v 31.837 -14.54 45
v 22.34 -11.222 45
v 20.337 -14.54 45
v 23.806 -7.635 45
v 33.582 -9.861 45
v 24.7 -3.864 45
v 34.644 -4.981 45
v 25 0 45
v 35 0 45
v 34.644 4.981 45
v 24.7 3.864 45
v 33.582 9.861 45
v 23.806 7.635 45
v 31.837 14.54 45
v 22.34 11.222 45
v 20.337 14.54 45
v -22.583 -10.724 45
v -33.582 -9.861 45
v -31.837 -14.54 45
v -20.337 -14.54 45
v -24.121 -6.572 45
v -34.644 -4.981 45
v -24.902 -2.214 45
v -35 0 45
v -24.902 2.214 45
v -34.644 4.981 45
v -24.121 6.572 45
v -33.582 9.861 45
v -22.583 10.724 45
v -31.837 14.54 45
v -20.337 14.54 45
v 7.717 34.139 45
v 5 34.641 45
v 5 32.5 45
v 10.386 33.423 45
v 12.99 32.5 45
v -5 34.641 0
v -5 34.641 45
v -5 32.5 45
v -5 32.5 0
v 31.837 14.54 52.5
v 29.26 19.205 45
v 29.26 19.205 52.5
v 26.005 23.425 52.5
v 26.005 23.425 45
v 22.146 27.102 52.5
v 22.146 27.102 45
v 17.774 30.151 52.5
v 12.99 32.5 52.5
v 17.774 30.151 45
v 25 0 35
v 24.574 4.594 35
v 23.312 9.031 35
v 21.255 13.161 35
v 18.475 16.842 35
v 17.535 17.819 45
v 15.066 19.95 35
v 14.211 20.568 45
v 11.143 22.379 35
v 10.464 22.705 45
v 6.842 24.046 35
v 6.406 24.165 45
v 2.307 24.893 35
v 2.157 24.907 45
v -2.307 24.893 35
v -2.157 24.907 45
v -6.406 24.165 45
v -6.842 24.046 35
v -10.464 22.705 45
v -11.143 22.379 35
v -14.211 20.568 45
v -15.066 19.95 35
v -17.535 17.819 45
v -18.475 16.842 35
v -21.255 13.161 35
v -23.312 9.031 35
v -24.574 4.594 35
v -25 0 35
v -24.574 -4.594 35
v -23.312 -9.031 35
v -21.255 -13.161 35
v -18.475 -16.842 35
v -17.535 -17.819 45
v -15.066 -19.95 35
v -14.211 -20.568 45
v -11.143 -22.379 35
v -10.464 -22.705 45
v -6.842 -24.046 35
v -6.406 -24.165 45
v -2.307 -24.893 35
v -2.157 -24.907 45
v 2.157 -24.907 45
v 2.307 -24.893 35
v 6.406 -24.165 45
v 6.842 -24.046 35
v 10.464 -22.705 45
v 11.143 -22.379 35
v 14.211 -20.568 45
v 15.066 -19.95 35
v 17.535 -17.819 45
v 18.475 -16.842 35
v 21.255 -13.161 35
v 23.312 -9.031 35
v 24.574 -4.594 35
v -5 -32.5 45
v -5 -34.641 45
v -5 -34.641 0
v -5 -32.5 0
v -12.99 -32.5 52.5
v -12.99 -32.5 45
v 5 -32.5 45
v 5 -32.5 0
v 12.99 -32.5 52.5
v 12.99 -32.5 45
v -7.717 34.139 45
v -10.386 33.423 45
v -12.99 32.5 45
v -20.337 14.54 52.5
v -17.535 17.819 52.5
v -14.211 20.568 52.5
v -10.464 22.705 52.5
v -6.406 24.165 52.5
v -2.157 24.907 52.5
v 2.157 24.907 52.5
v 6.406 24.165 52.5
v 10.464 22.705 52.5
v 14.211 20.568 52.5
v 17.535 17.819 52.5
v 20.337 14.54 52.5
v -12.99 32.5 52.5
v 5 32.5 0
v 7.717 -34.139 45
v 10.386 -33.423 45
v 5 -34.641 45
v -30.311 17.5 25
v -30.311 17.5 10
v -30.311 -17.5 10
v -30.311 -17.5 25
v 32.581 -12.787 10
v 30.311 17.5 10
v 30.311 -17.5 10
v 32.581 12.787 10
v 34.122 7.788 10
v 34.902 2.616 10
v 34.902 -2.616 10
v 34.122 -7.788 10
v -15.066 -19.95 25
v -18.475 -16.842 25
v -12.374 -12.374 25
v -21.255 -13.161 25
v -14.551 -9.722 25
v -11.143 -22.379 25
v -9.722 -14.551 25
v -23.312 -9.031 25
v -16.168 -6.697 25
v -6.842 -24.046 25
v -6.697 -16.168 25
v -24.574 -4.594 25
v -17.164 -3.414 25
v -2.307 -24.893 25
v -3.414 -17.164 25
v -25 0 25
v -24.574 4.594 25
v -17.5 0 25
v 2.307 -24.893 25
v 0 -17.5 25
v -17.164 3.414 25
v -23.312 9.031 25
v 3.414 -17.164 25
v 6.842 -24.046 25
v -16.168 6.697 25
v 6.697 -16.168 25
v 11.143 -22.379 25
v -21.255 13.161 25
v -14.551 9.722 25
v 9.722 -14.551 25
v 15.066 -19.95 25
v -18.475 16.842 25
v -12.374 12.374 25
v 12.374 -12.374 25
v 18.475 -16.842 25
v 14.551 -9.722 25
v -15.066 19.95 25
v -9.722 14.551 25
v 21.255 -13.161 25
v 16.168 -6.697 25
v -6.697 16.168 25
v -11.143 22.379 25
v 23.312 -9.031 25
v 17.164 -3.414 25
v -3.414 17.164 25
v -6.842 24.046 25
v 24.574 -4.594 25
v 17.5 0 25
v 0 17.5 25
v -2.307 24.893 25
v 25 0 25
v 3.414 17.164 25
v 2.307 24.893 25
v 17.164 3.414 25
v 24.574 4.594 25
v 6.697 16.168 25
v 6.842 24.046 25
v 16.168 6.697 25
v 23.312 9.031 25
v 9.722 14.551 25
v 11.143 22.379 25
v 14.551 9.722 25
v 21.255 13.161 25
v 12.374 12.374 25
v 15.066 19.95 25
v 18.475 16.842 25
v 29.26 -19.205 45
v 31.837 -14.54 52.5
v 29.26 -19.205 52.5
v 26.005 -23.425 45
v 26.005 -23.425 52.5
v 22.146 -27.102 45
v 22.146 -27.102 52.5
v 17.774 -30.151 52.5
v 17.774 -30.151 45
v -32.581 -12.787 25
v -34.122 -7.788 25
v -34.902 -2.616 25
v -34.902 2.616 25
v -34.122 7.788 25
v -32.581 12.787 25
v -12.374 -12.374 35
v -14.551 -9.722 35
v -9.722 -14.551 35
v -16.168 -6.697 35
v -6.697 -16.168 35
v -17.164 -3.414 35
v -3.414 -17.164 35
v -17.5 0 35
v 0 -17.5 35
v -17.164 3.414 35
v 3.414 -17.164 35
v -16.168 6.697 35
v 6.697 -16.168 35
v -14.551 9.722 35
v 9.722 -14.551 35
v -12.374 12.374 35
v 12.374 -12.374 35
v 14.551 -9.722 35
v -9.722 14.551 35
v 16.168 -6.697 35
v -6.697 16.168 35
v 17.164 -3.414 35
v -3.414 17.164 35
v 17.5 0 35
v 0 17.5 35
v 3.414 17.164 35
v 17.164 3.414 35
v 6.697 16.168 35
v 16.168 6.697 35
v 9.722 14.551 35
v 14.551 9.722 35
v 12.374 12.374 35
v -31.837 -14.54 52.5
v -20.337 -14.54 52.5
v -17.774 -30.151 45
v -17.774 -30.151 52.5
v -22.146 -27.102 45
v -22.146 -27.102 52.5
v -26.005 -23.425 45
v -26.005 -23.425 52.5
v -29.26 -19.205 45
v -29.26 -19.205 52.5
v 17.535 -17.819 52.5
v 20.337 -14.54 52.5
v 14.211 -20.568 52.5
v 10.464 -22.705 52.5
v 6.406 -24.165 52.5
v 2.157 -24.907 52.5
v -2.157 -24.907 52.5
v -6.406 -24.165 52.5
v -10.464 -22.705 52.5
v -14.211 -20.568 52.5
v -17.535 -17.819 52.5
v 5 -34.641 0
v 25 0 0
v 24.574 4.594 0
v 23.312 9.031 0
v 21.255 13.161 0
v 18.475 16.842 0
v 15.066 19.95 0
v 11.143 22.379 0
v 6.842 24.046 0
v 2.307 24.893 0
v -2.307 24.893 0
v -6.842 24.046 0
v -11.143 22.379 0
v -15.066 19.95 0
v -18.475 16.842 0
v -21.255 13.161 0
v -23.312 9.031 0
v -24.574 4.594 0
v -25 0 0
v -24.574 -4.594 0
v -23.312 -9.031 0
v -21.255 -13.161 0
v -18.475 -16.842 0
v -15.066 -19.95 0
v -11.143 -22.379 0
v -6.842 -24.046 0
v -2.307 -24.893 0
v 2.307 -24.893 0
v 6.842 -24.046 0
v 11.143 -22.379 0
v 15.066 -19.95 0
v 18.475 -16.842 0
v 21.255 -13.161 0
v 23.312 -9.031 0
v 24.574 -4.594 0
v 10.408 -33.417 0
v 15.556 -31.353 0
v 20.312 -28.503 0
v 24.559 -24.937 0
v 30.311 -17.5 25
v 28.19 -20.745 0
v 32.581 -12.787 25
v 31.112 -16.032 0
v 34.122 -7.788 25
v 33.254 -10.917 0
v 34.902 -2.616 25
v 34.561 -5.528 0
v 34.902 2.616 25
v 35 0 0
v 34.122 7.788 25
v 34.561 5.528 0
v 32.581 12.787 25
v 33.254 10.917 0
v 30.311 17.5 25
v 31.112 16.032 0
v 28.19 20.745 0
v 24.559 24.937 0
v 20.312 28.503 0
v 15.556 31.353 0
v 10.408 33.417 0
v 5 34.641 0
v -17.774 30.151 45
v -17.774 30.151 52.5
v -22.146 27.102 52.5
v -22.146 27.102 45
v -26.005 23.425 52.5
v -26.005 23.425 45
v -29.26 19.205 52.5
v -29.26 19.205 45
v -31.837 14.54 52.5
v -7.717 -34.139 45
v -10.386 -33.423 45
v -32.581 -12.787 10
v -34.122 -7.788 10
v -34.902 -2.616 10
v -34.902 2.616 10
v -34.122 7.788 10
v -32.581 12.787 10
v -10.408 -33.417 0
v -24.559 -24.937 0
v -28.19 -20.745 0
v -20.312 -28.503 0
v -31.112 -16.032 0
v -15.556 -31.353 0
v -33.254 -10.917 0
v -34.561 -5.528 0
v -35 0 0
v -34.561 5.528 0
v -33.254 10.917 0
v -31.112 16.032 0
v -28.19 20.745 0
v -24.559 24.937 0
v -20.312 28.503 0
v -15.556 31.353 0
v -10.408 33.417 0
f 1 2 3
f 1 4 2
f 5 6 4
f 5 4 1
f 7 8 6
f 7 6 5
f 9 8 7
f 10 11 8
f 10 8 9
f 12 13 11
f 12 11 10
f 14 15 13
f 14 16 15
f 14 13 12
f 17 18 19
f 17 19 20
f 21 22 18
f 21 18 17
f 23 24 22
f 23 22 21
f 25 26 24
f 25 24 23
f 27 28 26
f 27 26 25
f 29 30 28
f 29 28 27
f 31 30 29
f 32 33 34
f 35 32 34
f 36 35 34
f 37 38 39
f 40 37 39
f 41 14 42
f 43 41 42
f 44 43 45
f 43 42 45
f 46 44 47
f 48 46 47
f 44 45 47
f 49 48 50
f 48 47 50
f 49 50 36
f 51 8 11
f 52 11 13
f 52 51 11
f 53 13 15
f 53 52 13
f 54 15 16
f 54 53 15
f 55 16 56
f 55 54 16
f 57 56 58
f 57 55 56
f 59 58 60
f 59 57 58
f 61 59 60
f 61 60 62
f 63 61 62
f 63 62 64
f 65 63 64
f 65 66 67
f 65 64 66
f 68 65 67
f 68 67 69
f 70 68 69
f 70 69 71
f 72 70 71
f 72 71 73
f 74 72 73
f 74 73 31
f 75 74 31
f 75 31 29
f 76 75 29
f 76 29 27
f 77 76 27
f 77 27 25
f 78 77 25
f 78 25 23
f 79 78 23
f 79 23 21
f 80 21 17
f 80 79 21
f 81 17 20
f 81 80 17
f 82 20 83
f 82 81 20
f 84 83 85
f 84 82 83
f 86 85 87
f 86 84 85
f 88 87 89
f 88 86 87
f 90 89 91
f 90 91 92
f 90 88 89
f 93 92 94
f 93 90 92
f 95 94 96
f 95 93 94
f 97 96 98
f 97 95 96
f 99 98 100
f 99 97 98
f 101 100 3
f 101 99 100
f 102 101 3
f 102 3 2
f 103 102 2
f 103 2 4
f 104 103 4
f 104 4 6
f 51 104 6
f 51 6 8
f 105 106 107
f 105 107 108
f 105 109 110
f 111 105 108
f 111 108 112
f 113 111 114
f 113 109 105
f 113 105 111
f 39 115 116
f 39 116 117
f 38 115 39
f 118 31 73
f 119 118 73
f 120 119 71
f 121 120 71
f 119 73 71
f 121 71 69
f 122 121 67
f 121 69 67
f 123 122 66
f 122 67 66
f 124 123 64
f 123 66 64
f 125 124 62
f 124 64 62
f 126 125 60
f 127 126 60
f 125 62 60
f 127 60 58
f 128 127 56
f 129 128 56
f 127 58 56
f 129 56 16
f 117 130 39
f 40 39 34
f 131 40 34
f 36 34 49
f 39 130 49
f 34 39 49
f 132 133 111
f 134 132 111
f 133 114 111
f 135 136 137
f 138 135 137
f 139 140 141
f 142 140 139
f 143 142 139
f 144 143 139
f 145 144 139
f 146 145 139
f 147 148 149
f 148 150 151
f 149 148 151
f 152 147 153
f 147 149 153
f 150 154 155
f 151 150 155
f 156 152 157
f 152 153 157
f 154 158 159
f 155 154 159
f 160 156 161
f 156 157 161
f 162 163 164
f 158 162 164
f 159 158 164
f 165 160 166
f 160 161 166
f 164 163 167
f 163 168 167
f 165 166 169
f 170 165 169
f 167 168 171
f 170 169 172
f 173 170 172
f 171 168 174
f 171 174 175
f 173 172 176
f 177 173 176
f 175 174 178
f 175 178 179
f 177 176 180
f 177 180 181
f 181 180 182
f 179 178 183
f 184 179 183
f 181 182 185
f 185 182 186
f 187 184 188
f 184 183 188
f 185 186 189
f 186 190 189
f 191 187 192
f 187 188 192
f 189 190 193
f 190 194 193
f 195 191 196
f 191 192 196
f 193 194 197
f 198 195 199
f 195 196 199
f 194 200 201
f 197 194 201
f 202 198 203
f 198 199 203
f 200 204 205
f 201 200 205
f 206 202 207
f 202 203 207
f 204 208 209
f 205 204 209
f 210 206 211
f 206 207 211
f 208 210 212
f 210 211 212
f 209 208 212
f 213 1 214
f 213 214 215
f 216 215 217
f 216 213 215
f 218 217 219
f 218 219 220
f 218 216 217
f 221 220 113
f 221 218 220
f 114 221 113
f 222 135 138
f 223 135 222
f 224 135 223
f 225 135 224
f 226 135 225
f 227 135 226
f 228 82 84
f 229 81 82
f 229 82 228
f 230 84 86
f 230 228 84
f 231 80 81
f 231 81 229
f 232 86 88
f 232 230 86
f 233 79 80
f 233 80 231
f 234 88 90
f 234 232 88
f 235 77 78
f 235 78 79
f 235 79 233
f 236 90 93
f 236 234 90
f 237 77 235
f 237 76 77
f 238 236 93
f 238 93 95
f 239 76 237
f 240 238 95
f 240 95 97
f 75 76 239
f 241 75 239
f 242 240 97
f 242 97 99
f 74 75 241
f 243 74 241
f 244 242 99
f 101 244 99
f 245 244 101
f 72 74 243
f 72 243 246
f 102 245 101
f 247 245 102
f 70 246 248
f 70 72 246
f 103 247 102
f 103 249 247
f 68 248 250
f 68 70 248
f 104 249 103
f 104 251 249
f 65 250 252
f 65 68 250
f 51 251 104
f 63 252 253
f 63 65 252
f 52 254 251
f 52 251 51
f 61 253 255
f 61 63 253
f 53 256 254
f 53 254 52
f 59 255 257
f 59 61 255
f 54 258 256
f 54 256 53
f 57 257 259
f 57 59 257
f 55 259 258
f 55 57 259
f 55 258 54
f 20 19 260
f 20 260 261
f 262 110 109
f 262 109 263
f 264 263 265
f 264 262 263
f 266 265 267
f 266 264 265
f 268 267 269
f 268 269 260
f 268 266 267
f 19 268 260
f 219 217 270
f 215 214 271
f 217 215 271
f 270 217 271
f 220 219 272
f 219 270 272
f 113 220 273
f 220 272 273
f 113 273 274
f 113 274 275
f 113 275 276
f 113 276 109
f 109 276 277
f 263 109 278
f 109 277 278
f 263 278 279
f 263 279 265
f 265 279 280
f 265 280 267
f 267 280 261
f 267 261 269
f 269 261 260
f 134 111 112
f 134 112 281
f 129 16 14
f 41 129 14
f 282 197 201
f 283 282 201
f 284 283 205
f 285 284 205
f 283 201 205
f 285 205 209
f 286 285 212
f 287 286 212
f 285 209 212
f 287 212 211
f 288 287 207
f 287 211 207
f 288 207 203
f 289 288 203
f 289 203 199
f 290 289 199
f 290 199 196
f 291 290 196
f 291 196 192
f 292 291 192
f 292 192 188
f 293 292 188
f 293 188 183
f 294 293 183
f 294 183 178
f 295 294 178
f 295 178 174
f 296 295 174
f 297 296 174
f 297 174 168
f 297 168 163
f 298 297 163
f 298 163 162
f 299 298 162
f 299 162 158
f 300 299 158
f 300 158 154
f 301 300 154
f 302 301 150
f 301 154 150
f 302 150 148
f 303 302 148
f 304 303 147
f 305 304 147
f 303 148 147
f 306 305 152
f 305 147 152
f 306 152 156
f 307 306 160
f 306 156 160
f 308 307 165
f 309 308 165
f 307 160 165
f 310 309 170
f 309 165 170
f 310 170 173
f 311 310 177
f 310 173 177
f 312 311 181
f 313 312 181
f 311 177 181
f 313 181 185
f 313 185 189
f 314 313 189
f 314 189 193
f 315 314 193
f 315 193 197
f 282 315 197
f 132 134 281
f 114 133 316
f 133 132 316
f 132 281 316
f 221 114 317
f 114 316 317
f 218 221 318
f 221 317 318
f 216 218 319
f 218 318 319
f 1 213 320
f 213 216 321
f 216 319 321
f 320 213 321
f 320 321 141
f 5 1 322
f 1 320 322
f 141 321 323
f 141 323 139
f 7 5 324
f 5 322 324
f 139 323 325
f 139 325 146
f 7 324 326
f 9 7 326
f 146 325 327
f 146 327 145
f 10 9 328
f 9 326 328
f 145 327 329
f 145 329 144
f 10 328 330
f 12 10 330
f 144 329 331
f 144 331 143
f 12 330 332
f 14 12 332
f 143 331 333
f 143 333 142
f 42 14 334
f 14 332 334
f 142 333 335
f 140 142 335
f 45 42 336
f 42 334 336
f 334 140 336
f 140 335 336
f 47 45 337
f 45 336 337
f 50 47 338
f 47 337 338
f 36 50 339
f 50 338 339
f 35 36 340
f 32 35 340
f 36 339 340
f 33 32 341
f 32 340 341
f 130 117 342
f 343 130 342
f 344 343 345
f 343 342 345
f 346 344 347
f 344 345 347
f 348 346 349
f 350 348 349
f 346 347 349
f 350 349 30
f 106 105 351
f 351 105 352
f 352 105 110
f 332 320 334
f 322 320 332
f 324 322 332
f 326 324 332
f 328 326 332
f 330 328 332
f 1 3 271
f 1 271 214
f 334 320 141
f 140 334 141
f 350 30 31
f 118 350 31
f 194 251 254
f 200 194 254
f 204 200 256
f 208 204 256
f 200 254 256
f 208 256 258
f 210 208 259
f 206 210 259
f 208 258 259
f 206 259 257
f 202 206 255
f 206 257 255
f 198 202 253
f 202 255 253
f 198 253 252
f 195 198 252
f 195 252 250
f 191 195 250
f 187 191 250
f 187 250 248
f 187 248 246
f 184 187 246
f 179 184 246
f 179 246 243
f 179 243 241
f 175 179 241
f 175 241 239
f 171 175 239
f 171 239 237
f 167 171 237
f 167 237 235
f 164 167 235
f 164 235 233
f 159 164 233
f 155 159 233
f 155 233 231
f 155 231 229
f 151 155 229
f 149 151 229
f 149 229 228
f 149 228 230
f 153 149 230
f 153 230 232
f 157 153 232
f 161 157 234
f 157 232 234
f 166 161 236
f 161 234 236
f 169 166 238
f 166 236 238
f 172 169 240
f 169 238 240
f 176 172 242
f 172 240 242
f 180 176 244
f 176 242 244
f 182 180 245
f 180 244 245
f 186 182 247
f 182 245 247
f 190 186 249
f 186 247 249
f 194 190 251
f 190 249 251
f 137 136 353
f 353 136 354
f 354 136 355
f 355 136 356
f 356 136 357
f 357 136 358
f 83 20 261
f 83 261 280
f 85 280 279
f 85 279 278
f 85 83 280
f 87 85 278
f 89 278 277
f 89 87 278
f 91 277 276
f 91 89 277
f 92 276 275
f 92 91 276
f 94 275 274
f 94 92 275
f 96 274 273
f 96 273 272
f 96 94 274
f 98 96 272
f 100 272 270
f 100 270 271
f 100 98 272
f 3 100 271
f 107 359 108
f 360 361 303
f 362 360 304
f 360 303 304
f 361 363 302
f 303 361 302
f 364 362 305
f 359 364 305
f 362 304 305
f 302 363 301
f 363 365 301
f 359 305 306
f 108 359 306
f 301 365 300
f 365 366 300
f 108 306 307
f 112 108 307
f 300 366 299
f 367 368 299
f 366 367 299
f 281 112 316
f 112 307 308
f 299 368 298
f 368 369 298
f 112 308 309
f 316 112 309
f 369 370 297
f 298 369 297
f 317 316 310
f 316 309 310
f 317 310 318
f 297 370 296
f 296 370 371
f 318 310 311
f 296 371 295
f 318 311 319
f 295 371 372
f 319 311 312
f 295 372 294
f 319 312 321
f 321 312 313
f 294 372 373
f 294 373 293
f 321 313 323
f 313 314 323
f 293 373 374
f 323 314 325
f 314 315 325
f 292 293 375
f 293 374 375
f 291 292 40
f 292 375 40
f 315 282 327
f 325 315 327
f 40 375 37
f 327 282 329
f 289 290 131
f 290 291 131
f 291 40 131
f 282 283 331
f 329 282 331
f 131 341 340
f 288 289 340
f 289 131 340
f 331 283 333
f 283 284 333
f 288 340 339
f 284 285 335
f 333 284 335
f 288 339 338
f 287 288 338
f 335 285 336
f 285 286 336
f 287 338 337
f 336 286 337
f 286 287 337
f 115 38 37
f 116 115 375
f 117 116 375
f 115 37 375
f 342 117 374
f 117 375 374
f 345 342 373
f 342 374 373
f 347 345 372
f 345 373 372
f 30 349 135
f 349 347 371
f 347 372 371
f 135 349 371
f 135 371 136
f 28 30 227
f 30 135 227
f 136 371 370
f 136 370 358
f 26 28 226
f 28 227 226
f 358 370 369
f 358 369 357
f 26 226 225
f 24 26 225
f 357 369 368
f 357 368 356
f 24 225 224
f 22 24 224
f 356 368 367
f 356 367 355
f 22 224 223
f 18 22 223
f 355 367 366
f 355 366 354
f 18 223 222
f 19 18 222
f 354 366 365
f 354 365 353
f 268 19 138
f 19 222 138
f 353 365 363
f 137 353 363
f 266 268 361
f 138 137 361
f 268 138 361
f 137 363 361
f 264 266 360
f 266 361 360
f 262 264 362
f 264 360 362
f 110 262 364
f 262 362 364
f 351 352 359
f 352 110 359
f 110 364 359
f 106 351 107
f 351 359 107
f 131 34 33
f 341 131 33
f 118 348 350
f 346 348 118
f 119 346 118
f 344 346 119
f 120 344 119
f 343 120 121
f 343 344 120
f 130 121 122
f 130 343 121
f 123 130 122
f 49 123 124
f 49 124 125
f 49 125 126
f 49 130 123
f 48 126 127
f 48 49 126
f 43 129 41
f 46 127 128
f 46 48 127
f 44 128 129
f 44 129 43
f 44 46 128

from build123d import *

# Parameters (mm, degrees)
SKETCH1_R                = 35
BOSS_EXTRUDE1_DEPTH      = 10
BOSS_EXTRUDE3_DEPTH      = 15
SKETCH3_R                = 25
CUT_EXTRUDE1_DEPTH       = 58
SKETCH4_R                = 35
BOSS_EXTRUDE5_DEPTH      = 10
SKETCH8_R                = 17.5
CUT_EXTRUDE4_DEPTH       = 201.5
SKETCH9_R                = 35
SKETCH9_R_2              = 25
BOSS_EXTRUDE7_DEPTH      = 10
BOSS_EXTRUDE8_DEPTH      = 7.5
CUT_EXTRUDE5_DEPTH       = 7.5
CUT_EXTRUDE15_DEPTH      = 91
CUT_EXTRUDE16_DEPTH      = 91
SKETCH21_W               = 4.689110868
SKETCH21_H               = 15
CUT_EXTRUDE17_DEPTH      = 40
CUT_EXTRUDE17_DEPTH_BACK = 30


with BuildPart() as part:
    # Sketch1 → Boss-Extrude1 (new body)
    with BuildSketch(Plane.XY):
        Circle(SKETCH1_R)
    extrude(amount=BOSS_EXTRUDE1_DEPTH)

    # Sketch2 → Boss-Extrude3 (add)
    with BuildSketch(Plane.XY.offset(10)):
        with BuildLine():
            Line((-30.310889132, 17.5), (-30.310889132, -17.5))
            ThreePointArc((-30.310889132, -17.5), (35, 0), (-30.310889132, 17.5))
        make_face()
    extrude(amount=BOSS_EXTRUDE3_DEPTH)

    # Sketch3 → Cut-Extrude1 (cut)
    with BuildSketch(Plane.XY.offset(25)):
        Circle(SKETCH3_R)
    extrude(amount=-CUT_EXTRUDE1_DEPTH, mode=Mode.SUBTRACT)

    # Sketch4 → Boss-Extrude5 (add)
    with BuildSketch(Plane.XY.offset(25)):
        Circle(SKETCH4_R)
    extrude(amount=BOSS_EXTRUDE5_DEPTH)

    # Sketch8 → Cut-Extrude4 (cut)
    with BuildSketch(Plane.XY.offset(35)):
        Circle(SKETCH8_R)
    extrude(amount=-CUT_EXTRUDE4_DEPTH, mode=Mode.SUBTRACT)

    # Sketch9 → Boss-Extrude7 (add)
    with BuildSketch(Plane.XY.offset(35)):
        Circle(SKETCH9_R)
        Circle(SKETCH9_R_2, mode=Mode.SUBTRACT)
    extrude(amount=BOSS_EXTRUDE7_DEPTH)

    # Sketch10 → Boss-Extrude8 (add)
    with BuildSketch(Plane.XY.offset(45)):
        with BuildLine():
            Line((-31.836956522, 14.539883061), (-20.336956522, 14.539883061))
            ThreePointArc((-20.336956522, 14.539883061), (0, 25), (20.336956522, 14.539883061))
            Line((20.336956522, 14.539883061), (31.836956522, 14.539883061))
            ThreePointArc((31.836956522, 14.539883061), (0, 35), (-31.836956522, 14.539883061))
        make_face()
        with BuildLine():
            Line((-31.836956522, -14.539883061), (-20.336956522, -14.539883061))
            ThreePointArc((-20.336956522, -14.539883061), (0, -25), (20.336956522, -14.539883061))
            Line((20.336956522, -14.539883061), (31.836956522, -14.539883061))
            ThreePointArc((31.836956522, -14.539883061), (0, -35), (-31.836956522, -14.539883061))
        make_face()
    extrude(amount=BOSS_EXTRUDE8_DEPTH)

    # Sketch11 → Cut-Extrude5 (cut)
    with BuildSketch(Plane.XY.offset(52.5)):
        with BuildLine():
            Line((-12.990381057, -32.5), (12.990381057, -32.5))
            ThreePointArc((12.990381057, -32.5), (0, -35), (-12.990381057, -32.5))
        make_face()
        with BuildLine():
            Line((-12.990381057, 32.5), (12.990381057, 32.5))
            ThreePointArc((12.990381057, 32.5), (0, 35), (-12.990381057, 32.5))
        make_face()
    extrude(amount=-CUT_EXTRUDE5_DEPTH, mode=Mode.SUBTRACT)

    # Sketch19 → Cut-Extrude15 (cut)
    with BuildSketch(Plane.XY.offset(45)):
        with BuildLine():
            Line((-5, 34.641016151), (-5, 32.5))
            Line((-5, 32.5), (5, 32.5))
            Line((5, 32.5), (5, 34.641016151))
            ThreePointArc((5, 34.641016151), (0, 35), (-5, 34.641016151))
        make_face()
    extrude(amount=-CUT_EXTRUDE15_DEPTH, mode=Mode.SUBTRACT)

    # Sketch20 → Cut-Extrude16 (cut)
    with BuildSketch(Plane.XY.offset(45)):
        with BuildLine():
            Line((-5, -34.641016151), (-5, -32.5))
            Line((-5, -32.5), (5, -32.5))
            Line((5, -32.5), (5, -34.641016151))
            ThreePointArc((5, -34.641016151), (0, -35), (-5, -34.641016151))
        make_face()
    extrude(amount=-CUT_EXTRUDE16_DEPTH, mode=Mode.SUBTRACT)

    # Sketch21 → Cut-Extrude17 (cut, two sides)
    with BuildSketch(Plane(origin=(0, 0, 0), x_dir=(1, 0, 0), z_dir=(0, 1, 0))) as cut_extrude17_sk:
        with Locations((32.655444566, -17.5)):
            Rectangle(SKETCH21_W, SKETCH21_H)
    extrude(amount=CUT_EXTRUDE17_DEPTH, mode=Mode.SUBTRACT)
    extrude(cut_extrude17_sk.sketch, amount=-CUT_EXTRUDE17_DEPTH_BACK, mode=Mode.SUBTRACT)


solid = part.part
